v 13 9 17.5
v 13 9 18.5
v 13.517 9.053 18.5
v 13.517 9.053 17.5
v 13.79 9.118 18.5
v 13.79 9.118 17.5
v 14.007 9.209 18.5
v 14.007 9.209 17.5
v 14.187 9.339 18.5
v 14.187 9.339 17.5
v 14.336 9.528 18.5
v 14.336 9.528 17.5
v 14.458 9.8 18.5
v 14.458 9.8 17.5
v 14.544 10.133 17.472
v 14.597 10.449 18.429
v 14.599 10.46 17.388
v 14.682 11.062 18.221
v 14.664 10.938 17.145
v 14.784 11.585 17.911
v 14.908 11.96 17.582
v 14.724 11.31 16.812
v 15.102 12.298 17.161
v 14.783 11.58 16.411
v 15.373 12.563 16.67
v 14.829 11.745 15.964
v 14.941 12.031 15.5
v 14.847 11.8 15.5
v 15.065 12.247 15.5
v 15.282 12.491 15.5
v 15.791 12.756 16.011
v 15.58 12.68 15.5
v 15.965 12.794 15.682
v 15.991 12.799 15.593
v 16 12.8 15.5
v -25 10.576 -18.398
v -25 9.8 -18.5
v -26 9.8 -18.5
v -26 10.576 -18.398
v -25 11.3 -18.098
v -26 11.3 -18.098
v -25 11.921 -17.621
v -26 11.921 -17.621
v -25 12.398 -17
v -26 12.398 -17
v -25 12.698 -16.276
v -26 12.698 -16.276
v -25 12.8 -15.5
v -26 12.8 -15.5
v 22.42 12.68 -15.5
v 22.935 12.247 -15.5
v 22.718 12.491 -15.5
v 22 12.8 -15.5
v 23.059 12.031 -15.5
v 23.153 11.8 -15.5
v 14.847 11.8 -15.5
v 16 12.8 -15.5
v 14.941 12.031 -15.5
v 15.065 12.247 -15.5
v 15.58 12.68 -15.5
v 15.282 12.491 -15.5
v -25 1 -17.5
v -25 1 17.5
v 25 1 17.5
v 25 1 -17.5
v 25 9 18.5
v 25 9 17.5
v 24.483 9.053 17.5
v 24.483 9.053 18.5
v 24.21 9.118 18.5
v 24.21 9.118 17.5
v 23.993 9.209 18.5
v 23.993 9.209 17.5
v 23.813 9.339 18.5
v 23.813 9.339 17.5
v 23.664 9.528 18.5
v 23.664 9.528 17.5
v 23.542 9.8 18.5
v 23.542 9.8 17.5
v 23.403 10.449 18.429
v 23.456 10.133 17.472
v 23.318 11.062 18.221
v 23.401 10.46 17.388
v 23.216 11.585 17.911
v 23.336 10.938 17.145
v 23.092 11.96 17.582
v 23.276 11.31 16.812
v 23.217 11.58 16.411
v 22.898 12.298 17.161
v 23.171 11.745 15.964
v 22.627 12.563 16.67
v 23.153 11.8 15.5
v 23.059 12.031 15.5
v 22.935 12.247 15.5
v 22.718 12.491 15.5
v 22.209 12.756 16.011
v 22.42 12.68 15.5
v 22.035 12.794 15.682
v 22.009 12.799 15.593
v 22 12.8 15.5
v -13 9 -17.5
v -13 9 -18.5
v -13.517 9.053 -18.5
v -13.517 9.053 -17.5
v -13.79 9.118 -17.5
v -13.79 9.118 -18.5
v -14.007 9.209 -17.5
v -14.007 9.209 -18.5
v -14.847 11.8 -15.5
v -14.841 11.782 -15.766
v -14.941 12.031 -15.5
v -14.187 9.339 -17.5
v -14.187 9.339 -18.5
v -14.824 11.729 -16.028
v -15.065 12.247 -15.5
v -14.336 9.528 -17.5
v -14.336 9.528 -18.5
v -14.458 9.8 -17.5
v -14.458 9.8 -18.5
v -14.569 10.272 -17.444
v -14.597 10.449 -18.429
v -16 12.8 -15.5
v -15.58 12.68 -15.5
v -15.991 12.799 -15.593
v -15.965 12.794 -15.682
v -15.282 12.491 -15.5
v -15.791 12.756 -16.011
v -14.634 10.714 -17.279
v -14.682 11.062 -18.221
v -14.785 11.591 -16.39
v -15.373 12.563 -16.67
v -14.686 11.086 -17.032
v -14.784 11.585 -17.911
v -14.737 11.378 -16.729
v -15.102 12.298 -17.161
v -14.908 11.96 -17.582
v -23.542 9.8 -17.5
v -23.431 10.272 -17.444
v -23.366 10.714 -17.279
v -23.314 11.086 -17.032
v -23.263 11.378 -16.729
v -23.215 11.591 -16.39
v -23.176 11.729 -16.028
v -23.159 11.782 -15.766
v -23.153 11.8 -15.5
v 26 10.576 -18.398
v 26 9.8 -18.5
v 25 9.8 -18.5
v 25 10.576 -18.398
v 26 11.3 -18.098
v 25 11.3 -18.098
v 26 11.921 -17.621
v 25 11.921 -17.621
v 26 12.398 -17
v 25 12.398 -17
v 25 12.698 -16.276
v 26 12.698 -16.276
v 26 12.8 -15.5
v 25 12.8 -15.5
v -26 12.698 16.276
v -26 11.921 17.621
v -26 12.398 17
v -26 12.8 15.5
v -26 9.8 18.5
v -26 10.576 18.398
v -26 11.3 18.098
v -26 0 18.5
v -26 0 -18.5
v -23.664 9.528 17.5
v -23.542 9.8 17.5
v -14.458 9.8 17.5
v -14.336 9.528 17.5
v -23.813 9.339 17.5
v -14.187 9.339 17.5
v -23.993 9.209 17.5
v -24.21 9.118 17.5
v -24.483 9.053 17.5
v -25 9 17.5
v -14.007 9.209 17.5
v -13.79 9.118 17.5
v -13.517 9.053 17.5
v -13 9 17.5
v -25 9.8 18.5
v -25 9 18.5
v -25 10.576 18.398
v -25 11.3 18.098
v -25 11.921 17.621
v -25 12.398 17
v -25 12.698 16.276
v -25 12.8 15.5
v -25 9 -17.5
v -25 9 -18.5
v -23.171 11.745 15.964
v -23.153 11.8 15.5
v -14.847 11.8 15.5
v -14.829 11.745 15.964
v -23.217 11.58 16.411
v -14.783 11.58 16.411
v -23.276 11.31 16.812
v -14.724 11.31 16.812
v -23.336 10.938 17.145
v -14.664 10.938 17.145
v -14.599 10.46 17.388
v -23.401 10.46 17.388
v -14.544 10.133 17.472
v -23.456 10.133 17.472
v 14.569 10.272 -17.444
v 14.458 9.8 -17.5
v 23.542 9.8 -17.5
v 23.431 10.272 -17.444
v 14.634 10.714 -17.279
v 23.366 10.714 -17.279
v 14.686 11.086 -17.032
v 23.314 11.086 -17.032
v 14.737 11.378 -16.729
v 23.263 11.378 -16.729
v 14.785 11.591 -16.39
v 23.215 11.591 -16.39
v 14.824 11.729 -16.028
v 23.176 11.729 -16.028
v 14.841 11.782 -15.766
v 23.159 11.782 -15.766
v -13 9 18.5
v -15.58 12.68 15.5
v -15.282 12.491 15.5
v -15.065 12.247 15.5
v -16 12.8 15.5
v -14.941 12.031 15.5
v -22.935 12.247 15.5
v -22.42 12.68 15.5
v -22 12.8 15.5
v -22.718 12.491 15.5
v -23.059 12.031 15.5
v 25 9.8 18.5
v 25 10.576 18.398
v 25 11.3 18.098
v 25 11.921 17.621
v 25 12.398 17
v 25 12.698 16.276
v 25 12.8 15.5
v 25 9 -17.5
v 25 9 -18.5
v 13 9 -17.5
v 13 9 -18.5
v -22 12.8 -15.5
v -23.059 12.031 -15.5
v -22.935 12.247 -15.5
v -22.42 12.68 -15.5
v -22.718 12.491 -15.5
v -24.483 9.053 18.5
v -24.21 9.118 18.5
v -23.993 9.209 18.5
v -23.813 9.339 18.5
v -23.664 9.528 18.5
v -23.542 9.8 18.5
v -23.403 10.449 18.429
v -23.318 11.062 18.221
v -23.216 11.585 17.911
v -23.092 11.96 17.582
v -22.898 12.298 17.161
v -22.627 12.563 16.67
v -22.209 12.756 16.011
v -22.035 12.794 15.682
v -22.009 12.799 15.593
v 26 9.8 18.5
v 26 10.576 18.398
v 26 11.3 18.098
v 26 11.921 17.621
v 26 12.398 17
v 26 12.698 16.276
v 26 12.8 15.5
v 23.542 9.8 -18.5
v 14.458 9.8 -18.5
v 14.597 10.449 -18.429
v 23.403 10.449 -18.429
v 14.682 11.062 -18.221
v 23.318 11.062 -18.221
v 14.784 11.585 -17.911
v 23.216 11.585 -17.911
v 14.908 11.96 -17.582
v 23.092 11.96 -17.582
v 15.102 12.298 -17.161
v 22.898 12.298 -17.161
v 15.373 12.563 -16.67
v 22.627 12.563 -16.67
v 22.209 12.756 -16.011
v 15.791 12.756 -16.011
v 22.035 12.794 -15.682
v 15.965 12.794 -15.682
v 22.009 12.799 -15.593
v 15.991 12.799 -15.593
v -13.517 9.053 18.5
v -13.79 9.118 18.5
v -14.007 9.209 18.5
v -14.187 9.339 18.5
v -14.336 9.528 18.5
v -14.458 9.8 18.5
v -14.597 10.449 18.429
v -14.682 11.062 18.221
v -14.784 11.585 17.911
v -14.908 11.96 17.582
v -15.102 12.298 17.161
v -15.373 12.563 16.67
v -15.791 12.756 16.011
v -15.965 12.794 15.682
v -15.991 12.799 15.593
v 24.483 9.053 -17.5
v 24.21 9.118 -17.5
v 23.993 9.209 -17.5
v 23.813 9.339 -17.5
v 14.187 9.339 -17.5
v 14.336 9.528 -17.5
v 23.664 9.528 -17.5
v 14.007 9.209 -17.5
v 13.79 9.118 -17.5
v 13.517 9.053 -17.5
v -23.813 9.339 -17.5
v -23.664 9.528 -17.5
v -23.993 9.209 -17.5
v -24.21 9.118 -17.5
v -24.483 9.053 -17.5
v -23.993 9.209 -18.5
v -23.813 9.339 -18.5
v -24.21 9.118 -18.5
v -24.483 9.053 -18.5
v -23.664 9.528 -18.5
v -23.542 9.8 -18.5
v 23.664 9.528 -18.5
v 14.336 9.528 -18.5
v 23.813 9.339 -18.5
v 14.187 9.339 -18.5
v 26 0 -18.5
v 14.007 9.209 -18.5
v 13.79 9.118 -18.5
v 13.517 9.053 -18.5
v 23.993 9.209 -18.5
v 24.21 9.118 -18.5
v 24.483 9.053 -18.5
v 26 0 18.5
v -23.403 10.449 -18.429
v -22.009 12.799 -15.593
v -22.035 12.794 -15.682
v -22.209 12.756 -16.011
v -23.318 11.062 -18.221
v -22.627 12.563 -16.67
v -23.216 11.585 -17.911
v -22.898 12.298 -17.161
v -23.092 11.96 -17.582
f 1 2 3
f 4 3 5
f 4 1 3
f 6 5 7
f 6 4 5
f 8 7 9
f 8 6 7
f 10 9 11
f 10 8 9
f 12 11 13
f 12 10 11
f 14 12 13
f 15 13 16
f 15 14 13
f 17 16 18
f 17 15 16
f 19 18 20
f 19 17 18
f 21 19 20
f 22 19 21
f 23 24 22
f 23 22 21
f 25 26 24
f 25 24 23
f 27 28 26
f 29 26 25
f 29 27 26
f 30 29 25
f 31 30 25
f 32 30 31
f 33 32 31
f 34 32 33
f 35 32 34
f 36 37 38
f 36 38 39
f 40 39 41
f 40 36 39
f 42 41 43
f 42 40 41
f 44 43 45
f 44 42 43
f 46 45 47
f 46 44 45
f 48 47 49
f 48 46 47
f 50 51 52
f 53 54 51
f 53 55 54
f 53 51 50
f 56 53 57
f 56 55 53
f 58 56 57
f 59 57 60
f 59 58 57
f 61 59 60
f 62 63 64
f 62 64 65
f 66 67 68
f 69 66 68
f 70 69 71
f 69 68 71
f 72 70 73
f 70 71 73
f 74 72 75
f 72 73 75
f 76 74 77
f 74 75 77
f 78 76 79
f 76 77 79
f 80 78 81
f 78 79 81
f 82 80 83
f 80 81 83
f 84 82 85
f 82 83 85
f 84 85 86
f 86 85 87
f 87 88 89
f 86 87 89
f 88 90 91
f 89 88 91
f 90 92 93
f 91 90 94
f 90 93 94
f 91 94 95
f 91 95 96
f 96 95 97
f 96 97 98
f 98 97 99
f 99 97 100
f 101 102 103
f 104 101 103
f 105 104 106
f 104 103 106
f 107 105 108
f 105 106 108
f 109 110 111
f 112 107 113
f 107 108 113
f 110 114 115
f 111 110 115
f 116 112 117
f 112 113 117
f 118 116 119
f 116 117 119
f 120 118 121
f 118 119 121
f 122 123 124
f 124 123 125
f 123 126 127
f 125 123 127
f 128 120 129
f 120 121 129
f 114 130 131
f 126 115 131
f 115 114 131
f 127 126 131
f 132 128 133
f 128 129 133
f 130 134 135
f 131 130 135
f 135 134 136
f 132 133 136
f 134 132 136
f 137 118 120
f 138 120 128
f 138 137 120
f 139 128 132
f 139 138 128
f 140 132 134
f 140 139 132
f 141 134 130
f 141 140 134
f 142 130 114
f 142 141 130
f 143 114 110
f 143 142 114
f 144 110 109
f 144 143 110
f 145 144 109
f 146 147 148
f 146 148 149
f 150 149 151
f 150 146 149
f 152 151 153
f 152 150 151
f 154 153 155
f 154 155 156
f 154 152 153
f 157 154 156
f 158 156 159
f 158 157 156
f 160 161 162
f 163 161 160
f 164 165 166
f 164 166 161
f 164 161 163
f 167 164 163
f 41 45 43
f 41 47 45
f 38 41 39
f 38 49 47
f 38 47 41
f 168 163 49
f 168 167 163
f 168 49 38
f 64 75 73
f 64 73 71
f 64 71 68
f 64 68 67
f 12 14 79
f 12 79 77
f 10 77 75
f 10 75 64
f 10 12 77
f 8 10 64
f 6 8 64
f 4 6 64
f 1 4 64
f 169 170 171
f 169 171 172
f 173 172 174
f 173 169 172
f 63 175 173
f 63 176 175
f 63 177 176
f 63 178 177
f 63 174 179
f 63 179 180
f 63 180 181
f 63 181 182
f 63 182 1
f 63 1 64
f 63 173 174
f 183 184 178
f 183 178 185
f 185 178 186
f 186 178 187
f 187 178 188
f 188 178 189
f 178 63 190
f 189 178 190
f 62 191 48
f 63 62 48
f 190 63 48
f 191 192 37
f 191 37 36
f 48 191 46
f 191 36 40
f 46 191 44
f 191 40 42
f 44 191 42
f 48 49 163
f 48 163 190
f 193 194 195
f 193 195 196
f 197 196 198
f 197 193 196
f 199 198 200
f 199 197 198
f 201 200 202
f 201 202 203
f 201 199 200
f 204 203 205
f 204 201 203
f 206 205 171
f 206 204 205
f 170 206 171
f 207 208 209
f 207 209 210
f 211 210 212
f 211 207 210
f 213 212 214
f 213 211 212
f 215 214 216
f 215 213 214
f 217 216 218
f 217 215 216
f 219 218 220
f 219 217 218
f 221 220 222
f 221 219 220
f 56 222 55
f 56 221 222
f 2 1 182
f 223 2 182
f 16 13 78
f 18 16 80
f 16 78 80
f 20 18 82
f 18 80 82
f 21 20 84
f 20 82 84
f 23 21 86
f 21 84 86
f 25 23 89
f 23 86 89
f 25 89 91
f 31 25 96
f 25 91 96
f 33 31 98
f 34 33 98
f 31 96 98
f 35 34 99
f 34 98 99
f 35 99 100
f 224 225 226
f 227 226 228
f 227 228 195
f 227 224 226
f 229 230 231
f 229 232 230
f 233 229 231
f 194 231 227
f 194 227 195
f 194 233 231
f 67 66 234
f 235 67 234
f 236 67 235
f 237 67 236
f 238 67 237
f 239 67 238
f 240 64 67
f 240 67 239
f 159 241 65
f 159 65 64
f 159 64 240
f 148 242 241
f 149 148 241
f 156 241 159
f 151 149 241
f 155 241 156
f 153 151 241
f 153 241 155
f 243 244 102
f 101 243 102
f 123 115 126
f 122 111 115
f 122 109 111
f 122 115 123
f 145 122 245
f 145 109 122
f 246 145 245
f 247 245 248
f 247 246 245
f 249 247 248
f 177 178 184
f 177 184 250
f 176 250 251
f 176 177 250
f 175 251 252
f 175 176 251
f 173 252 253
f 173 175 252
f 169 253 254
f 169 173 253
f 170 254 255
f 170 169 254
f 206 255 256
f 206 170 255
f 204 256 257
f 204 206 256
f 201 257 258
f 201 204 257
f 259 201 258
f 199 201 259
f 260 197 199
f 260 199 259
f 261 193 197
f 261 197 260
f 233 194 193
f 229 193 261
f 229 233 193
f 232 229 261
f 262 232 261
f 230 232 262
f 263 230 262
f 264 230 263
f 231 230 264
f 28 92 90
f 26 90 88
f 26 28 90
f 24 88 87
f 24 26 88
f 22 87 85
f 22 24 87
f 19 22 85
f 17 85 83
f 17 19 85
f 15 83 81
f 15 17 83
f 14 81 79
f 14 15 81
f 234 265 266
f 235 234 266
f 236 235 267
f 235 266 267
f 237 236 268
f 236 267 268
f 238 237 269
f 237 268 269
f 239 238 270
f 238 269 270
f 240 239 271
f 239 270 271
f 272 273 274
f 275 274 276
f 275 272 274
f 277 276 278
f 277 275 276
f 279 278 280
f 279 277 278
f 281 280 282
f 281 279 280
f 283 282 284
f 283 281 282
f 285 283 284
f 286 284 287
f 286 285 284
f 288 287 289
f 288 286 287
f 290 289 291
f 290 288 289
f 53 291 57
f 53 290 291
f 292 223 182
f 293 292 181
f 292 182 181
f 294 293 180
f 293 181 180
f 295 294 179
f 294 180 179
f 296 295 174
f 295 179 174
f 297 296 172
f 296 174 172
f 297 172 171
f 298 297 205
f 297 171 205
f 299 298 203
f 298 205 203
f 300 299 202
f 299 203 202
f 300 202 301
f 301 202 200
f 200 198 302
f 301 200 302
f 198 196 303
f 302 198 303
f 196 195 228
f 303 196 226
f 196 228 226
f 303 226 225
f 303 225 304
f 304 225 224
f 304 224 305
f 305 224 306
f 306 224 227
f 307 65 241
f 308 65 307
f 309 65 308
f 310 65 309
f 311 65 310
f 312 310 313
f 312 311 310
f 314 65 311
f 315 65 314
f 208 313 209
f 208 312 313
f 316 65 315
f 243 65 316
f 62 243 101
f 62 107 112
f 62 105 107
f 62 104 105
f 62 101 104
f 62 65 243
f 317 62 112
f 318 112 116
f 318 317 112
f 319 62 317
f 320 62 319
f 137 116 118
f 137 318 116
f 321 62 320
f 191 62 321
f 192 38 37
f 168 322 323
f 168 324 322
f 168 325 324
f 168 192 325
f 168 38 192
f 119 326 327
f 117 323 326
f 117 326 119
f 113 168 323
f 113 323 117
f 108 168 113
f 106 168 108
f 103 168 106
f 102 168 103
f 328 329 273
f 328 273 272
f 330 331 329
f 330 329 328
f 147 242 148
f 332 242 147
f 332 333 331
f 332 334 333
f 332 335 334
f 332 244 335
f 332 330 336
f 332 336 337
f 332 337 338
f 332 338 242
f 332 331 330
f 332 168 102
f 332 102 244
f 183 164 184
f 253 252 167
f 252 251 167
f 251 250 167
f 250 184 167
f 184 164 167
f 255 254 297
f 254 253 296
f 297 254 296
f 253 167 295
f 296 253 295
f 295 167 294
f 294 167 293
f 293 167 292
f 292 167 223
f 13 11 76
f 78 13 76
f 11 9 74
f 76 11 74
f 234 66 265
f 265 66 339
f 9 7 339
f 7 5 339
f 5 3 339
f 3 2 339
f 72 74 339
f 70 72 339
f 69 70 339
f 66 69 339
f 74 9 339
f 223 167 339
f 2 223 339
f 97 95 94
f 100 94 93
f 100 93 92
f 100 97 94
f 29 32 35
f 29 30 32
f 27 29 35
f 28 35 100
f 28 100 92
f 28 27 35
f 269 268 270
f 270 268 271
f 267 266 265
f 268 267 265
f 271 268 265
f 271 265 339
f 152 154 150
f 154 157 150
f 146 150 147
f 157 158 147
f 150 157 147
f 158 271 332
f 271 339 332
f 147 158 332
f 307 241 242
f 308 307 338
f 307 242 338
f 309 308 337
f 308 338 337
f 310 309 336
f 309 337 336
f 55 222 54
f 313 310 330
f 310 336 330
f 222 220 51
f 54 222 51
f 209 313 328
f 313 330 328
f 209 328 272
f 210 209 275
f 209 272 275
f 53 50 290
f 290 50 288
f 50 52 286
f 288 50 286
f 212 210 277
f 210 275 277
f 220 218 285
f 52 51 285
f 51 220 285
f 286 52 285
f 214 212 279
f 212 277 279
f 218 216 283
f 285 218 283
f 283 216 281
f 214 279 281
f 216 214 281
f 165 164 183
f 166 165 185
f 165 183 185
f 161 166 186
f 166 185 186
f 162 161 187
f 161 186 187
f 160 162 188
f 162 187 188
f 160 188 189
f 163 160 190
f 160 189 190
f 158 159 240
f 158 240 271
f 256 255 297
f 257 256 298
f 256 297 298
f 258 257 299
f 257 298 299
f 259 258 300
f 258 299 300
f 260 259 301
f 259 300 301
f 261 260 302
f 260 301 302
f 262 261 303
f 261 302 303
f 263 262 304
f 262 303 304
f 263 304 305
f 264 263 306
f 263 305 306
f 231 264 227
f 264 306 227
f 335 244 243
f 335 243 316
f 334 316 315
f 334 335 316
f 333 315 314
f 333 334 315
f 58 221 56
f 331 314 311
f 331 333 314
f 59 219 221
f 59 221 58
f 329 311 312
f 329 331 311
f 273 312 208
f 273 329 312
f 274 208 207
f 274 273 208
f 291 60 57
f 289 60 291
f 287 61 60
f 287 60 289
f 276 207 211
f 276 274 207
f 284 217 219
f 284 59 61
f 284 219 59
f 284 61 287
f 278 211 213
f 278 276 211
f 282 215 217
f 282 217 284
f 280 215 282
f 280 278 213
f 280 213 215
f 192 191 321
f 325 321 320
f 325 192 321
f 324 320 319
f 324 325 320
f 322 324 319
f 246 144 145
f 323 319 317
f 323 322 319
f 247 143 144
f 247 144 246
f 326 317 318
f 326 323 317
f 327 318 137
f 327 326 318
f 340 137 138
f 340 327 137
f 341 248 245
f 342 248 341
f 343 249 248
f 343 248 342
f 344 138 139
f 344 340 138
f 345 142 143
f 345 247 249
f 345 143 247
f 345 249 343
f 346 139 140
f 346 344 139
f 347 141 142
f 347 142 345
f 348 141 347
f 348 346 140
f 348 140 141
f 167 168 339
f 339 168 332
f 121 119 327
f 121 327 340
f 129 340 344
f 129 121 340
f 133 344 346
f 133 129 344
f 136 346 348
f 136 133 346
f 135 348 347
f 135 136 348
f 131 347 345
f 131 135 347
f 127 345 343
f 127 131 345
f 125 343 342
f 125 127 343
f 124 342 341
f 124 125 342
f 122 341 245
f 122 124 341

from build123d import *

# Parameters (mm, degrees)
SKETCH1_W               = 52
SKETCH1_H               = 37
BOSS_EXTRUDE1_DEPTH     = 12.8
FILLET1_R               = 3
SHELL2_START            = -25
SHELL2_DEPTH            = 50
CUT_EXTRUDE1_DEPTH      = 47.998297842
CUT_EXTRUDE1_DEPTH_BACK = 47.998297842


# Read off the part's stored shape, not the designer's step: Shell2
with BuildPart() as part:
    # Sketch1 → Boss-Extrude1 (new body)
    with BuildSketch(Plane(origin=(0, 0, 0), x_dir=(1, 0, 0), z_dir=(0, 1, 0))):
        Rectangle(SKETCH1_W, SKETCH1_H)
    extrude(amount=BOSS_EXTRUDE1_DEPTH)

    # Fillet1
    fillet1_edges = [part.edges().sort_by_distance(p)[0] for p in [
        (0, 12.8, -18.5),
        (0, 12.8, 18.5),
    ]]
    fillet(fillet1_edges, radius=FILLET1_R)

    # Shell2 outline → Shell2 (cut)
    with BuildSketch(Plane.YZ.offset(SHELL2_START)):
        with BuildLine():
            Line((12.8, 15.5), (11.8, 15.5))
            ThreePointArc((11.8, 15.5), (11.214213562, 16.914213562), (9.8, 17.5))
            Line((9.8, 17.5), (1, 17.5))
            Line((1, 17.5), (1, -17.5))
            Line((1, -17.5), (9.8, -17.5))
            ThreePointArc((9.8, -17.5), (11.214213562, -16.914213562), (11.8, -15.5))
            Line((11.8, -15.5), (12.8, -15.5))
            Line((12.8, -15.5), (12.8, 15.5))
        make_face()
    extrude(amount=SHELL2_DEPTH, mode=Mode.SUBTRACT)

    # Sketch2 → Cut-Extrude1 (cut, two sides: drawn at the far end of the back side and taken through both)
    with BuildSketch(Plane.XY.offset(18.5).offset(-CUT_EXTRUDE1_DEPTH_BACK)):
        with BuildLine():
            Line((-25, 9), (-25, 12.8))
            Line((-25, 12.8), (-22, 12.8))
            add(Edge.make_bspline(
                [(-25, 9), (-24.337551865, 9.035956423), (-22.850759104, 9.461520311), (-23.745938666, 12.539955656), (-22, 12.8)],
                knots=[0, 0, 0, 0, 0.249396221, 1, 1, 1, 1], degree=3))
        make_face()
        with BuildLine():
            Line((-16, 12.8), (16, 12.8))
            add(Edge.make_bspline(
                [(13, 9), (13.662448135, 9.035956423), (15.149240896, 9.461520311), (14.254061334, 12.539955656), (16, 12.8)],
                knots=[0, 0, 0, 0, 0.249396221, 1, 1, 1, 1], degree=3))
            Line((13, 9), (-13, 9))
            add(Edge.make_bspline(
                [(-13, 9), (-13.662448135, 9.035956423), (-15.149240896, 9.461520311), (-14.254061334, 12.539955656), (-16, 12.8)],
                knots=[0, 0, 0, 0, 0.249396221, 1, 1, 1, 1], degree=3))
        make_face()
        with BuildLine():
            Line((25, 9), (25, 12.8))
            Line((25, 12.8), (22, 12.8))
            add(Edge.make_bspline(
                [(25, 9), (24.337551865, 9.035956423), (22.850759104, 9.461520311), (23.745938666, 12.539955656), (22, 12.8)],
                knots=[0, 0, 0, 0, 0.249396221, 1, 1, 1, 1], degree=3))
        make_face()
    extrude(amount=CUT_EXTRUDE1_DEPTH + CUT_EXTRUDE1_DEPTH_BACK, mode=Mode.SUBTRACT)


solid = part.part
